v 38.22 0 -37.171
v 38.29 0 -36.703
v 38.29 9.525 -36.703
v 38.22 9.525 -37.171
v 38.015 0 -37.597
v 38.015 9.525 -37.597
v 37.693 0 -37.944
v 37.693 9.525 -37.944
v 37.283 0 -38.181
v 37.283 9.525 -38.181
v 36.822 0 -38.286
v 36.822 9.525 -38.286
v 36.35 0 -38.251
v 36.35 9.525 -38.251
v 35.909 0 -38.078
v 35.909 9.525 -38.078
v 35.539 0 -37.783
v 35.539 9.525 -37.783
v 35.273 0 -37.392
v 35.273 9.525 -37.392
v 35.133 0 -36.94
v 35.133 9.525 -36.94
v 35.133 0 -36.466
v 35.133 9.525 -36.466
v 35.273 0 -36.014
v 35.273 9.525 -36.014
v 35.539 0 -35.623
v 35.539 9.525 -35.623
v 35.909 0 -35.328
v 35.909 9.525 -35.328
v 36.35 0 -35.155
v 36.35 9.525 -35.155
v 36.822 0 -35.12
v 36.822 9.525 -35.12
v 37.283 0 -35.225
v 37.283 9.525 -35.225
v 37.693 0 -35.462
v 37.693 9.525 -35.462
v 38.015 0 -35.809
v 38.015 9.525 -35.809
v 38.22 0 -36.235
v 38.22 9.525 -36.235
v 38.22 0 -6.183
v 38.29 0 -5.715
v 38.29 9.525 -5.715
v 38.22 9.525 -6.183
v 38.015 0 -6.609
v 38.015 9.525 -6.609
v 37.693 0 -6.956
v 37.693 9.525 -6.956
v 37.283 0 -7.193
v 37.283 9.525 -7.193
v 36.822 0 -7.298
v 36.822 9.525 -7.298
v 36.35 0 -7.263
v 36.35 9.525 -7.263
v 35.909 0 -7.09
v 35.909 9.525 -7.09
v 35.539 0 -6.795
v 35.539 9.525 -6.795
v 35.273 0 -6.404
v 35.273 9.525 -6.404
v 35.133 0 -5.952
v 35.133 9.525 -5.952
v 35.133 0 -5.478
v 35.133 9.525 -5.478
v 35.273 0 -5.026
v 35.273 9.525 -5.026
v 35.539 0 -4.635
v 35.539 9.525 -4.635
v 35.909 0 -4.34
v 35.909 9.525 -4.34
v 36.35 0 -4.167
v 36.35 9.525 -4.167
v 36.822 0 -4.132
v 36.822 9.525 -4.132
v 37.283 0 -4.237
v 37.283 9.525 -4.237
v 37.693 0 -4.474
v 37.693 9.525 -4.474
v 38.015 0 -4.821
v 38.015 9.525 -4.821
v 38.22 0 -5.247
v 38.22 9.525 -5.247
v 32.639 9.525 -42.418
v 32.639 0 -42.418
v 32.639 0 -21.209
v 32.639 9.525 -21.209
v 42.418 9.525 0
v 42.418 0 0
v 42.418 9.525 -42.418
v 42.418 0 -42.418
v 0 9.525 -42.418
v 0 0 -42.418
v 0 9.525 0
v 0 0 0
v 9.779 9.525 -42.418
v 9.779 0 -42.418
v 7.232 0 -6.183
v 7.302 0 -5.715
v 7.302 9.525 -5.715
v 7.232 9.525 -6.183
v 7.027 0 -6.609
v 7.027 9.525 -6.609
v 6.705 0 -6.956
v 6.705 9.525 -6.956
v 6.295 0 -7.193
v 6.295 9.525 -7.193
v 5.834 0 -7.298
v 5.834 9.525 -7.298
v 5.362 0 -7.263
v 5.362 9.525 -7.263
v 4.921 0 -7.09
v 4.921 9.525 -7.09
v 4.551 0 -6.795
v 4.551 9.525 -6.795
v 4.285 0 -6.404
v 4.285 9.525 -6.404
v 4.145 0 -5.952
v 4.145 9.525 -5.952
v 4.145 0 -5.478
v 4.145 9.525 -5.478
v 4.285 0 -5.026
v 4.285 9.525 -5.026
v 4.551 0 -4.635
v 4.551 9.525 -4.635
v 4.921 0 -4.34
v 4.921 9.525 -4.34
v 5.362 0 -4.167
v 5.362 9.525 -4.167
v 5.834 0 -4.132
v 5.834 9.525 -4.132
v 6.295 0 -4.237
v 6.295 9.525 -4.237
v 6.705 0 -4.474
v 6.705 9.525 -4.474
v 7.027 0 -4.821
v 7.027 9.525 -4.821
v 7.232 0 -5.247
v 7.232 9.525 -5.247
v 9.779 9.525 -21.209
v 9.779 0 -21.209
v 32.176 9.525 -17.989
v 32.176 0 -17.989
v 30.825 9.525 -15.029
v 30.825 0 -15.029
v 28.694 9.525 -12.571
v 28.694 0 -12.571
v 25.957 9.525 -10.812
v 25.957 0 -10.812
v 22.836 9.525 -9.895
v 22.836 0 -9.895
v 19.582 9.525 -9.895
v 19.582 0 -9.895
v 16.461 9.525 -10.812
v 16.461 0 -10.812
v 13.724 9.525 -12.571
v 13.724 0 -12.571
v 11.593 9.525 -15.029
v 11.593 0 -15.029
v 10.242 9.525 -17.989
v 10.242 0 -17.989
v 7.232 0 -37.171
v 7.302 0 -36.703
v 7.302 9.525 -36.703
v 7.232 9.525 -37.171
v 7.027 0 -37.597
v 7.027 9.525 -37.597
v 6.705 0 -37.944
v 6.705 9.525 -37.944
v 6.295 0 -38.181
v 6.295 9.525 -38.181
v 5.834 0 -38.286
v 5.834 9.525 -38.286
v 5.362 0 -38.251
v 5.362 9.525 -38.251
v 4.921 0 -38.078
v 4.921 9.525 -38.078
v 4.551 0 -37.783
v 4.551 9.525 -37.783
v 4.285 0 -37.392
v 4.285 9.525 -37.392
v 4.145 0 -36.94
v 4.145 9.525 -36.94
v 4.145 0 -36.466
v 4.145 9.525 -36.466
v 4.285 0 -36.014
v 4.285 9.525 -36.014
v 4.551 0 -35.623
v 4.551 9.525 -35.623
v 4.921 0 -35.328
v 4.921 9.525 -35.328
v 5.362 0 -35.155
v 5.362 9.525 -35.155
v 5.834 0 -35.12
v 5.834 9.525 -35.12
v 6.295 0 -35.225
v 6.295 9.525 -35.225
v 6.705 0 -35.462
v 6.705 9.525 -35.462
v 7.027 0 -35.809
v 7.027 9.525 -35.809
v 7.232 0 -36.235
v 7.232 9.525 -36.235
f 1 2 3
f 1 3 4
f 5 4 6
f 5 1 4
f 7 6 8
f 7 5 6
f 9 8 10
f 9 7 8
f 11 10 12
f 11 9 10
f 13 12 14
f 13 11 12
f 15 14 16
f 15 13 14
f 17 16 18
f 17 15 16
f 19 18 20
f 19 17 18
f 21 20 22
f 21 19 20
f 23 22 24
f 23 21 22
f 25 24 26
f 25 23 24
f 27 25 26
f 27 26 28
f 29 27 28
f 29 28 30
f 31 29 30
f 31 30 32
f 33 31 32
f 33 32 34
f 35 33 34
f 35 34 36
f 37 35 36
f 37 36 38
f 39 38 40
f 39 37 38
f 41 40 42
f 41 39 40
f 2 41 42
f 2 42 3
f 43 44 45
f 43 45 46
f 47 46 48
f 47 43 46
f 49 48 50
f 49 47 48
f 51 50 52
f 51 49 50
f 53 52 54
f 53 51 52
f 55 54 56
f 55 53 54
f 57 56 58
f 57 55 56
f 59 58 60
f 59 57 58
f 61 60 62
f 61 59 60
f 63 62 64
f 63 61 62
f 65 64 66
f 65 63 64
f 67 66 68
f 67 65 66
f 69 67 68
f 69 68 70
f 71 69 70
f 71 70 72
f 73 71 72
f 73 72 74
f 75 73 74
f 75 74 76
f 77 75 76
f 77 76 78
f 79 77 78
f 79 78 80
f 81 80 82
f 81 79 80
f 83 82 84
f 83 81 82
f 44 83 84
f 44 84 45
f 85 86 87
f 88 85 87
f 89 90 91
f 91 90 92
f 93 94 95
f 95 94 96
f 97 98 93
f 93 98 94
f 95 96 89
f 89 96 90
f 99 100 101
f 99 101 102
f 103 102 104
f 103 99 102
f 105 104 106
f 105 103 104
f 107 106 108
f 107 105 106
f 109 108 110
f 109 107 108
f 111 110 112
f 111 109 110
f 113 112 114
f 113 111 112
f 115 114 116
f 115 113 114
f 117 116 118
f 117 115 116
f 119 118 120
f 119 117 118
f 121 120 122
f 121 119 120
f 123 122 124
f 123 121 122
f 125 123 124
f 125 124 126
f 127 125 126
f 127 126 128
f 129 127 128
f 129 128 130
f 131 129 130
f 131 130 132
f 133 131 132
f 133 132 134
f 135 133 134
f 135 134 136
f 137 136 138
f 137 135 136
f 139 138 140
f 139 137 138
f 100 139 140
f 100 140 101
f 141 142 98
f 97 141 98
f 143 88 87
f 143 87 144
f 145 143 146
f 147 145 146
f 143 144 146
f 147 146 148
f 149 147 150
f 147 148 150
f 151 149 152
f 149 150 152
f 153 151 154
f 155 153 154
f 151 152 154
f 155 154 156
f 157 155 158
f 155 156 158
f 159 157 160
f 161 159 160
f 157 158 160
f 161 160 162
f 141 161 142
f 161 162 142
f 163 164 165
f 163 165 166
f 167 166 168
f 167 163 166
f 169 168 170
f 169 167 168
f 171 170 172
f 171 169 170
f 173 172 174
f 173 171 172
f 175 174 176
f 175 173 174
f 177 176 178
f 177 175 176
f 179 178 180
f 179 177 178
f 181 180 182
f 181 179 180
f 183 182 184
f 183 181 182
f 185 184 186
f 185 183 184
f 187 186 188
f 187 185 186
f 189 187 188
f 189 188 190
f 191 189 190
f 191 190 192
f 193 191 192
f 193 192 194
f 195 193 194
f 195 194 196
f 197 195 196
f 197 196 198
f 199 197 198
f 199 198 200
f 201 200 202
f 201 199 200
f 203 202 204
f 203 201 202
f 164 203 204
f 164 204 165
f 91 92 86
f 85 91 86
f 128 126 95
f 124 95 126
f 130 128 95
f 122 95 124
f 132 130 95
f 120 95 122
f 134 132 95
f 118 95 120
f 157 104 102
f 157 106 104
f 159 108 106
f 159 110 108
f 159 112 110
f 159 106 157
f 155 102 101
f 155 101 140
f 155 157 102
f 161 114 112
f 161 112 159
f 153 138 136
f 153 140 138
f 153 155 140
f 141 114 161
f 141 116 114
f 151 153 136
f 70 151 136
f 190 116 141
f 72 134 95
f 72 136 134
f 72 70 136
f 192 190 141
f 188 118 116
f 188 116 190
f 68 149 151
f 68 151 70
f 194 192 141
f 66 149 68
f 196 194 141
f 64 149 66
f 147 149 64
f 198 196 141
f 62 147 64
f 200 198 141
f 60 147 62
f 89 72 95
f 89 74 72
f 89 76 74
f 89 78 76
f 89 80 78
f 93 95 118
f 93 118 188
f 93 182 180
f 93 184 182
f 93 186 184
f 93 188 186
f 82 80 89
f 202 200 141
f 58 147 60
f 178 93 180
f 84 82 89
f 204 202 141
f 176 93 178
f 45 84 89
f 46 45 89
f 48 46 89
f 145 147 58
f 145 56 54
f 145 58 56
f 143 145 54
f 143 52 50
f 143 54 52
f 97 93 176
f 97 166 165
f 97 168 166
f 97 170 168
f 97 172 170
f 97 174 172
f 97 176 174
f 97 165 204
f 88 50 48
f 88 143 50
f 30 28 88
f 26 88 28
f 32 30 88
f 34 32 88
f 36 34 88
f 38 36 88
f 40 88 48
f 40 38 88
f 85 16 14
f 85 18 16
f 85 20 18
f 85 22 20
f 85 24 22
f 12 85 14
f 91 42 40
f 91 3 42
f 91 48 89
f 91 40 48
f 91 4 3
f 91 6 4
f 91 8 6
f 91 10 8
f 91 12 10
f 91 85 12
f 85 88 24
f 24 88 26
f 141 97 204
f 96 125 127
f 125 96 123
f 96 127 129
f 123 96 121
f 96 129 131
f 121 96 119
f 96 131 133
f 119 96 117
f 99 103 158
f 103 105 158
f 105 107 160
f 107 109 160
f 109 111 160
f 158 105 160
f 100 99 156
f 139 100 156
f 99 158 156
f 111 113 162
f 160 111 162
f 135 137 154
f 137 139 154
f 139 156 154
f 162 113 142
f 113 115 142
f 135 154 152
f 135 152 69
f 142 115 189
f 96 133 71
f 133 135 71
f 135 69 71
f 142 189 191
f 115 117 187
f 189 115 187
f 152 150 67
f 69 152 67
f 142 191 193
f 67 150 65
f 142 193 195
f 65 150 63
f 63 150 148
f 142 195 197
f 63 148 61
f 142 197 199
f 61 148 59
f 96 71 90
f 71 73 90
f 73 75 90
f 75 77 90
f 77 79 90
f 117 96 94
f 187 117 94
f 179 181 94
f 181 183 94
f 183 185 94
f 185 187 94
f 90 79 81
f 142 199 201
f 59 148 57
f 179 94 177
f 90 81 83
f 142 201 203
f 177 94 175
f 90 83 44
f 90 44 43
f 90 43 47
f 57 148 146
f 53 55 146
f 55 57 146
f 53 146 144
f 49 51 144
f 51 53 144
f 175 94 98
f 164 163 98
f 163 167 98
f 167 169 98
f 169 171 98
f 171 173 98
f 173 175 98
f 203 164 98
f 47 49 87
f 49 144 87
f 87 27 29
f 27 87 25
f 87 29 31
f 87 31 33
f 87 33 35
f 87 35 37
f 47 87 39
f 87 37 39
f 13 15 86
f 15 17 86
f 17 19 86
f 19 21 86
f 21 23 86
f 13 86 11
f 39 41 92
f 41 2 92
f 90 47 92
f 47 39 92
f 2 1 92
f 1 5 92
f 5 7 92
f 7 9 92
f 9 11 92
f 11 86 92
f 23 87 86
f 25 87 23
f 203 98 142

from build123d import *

# Parameters (mm, degrees)
SKETCH1_R           = 1.5875
BOSS_EXTRUDE1_DEPTH = 9.525


with BuildPart() as part:
    # Sketch1 → Boss-Extrude1 (new body)
    with BuildSketch(Plane(origin=(0, 0, 0), x_dir=(1, 0, 0), z_dir=(0, 1, 0))):
        with BuildLine():
            Line((0, 0), (42.418, 0))
            Line((42.418, 0), (42.418, 42.418))
            Line((42.418, 42.418), (32.639, 42.418))
            Line((32.639, 42.418), (32.639, 21.209))
            ThreePointArc((32.639, 21.209), (21.209, 9.779), (9.779, 21.209))
            Line((9.779, 21.209), (9.779, 42.418))
            Line((9.779, 42.418), (0, 42.418))
            Line((0, 42.418), (0, 0))
        make_face()
        with Locations((5.715, 36.703)):
            Circle(SKETCH1_R, mode=Mode.SUBTRACT)
        with Locations((36.703, 36.703)):
            Circle(SKETCH1_R, mode=Mode.SUBTRACT)
        with Locations((36.703, 5.715)):
            Circle(SKETCH1_R, mode=Mode.SUBTRACT)
        with Locations((5.715, 5.715)):
            Circle(SKETCH1_R, mode=Mode.SUBTRACT)
    extrude(amount=BOSS_EXTRUDE1_DEPTH)


solid = part.part
